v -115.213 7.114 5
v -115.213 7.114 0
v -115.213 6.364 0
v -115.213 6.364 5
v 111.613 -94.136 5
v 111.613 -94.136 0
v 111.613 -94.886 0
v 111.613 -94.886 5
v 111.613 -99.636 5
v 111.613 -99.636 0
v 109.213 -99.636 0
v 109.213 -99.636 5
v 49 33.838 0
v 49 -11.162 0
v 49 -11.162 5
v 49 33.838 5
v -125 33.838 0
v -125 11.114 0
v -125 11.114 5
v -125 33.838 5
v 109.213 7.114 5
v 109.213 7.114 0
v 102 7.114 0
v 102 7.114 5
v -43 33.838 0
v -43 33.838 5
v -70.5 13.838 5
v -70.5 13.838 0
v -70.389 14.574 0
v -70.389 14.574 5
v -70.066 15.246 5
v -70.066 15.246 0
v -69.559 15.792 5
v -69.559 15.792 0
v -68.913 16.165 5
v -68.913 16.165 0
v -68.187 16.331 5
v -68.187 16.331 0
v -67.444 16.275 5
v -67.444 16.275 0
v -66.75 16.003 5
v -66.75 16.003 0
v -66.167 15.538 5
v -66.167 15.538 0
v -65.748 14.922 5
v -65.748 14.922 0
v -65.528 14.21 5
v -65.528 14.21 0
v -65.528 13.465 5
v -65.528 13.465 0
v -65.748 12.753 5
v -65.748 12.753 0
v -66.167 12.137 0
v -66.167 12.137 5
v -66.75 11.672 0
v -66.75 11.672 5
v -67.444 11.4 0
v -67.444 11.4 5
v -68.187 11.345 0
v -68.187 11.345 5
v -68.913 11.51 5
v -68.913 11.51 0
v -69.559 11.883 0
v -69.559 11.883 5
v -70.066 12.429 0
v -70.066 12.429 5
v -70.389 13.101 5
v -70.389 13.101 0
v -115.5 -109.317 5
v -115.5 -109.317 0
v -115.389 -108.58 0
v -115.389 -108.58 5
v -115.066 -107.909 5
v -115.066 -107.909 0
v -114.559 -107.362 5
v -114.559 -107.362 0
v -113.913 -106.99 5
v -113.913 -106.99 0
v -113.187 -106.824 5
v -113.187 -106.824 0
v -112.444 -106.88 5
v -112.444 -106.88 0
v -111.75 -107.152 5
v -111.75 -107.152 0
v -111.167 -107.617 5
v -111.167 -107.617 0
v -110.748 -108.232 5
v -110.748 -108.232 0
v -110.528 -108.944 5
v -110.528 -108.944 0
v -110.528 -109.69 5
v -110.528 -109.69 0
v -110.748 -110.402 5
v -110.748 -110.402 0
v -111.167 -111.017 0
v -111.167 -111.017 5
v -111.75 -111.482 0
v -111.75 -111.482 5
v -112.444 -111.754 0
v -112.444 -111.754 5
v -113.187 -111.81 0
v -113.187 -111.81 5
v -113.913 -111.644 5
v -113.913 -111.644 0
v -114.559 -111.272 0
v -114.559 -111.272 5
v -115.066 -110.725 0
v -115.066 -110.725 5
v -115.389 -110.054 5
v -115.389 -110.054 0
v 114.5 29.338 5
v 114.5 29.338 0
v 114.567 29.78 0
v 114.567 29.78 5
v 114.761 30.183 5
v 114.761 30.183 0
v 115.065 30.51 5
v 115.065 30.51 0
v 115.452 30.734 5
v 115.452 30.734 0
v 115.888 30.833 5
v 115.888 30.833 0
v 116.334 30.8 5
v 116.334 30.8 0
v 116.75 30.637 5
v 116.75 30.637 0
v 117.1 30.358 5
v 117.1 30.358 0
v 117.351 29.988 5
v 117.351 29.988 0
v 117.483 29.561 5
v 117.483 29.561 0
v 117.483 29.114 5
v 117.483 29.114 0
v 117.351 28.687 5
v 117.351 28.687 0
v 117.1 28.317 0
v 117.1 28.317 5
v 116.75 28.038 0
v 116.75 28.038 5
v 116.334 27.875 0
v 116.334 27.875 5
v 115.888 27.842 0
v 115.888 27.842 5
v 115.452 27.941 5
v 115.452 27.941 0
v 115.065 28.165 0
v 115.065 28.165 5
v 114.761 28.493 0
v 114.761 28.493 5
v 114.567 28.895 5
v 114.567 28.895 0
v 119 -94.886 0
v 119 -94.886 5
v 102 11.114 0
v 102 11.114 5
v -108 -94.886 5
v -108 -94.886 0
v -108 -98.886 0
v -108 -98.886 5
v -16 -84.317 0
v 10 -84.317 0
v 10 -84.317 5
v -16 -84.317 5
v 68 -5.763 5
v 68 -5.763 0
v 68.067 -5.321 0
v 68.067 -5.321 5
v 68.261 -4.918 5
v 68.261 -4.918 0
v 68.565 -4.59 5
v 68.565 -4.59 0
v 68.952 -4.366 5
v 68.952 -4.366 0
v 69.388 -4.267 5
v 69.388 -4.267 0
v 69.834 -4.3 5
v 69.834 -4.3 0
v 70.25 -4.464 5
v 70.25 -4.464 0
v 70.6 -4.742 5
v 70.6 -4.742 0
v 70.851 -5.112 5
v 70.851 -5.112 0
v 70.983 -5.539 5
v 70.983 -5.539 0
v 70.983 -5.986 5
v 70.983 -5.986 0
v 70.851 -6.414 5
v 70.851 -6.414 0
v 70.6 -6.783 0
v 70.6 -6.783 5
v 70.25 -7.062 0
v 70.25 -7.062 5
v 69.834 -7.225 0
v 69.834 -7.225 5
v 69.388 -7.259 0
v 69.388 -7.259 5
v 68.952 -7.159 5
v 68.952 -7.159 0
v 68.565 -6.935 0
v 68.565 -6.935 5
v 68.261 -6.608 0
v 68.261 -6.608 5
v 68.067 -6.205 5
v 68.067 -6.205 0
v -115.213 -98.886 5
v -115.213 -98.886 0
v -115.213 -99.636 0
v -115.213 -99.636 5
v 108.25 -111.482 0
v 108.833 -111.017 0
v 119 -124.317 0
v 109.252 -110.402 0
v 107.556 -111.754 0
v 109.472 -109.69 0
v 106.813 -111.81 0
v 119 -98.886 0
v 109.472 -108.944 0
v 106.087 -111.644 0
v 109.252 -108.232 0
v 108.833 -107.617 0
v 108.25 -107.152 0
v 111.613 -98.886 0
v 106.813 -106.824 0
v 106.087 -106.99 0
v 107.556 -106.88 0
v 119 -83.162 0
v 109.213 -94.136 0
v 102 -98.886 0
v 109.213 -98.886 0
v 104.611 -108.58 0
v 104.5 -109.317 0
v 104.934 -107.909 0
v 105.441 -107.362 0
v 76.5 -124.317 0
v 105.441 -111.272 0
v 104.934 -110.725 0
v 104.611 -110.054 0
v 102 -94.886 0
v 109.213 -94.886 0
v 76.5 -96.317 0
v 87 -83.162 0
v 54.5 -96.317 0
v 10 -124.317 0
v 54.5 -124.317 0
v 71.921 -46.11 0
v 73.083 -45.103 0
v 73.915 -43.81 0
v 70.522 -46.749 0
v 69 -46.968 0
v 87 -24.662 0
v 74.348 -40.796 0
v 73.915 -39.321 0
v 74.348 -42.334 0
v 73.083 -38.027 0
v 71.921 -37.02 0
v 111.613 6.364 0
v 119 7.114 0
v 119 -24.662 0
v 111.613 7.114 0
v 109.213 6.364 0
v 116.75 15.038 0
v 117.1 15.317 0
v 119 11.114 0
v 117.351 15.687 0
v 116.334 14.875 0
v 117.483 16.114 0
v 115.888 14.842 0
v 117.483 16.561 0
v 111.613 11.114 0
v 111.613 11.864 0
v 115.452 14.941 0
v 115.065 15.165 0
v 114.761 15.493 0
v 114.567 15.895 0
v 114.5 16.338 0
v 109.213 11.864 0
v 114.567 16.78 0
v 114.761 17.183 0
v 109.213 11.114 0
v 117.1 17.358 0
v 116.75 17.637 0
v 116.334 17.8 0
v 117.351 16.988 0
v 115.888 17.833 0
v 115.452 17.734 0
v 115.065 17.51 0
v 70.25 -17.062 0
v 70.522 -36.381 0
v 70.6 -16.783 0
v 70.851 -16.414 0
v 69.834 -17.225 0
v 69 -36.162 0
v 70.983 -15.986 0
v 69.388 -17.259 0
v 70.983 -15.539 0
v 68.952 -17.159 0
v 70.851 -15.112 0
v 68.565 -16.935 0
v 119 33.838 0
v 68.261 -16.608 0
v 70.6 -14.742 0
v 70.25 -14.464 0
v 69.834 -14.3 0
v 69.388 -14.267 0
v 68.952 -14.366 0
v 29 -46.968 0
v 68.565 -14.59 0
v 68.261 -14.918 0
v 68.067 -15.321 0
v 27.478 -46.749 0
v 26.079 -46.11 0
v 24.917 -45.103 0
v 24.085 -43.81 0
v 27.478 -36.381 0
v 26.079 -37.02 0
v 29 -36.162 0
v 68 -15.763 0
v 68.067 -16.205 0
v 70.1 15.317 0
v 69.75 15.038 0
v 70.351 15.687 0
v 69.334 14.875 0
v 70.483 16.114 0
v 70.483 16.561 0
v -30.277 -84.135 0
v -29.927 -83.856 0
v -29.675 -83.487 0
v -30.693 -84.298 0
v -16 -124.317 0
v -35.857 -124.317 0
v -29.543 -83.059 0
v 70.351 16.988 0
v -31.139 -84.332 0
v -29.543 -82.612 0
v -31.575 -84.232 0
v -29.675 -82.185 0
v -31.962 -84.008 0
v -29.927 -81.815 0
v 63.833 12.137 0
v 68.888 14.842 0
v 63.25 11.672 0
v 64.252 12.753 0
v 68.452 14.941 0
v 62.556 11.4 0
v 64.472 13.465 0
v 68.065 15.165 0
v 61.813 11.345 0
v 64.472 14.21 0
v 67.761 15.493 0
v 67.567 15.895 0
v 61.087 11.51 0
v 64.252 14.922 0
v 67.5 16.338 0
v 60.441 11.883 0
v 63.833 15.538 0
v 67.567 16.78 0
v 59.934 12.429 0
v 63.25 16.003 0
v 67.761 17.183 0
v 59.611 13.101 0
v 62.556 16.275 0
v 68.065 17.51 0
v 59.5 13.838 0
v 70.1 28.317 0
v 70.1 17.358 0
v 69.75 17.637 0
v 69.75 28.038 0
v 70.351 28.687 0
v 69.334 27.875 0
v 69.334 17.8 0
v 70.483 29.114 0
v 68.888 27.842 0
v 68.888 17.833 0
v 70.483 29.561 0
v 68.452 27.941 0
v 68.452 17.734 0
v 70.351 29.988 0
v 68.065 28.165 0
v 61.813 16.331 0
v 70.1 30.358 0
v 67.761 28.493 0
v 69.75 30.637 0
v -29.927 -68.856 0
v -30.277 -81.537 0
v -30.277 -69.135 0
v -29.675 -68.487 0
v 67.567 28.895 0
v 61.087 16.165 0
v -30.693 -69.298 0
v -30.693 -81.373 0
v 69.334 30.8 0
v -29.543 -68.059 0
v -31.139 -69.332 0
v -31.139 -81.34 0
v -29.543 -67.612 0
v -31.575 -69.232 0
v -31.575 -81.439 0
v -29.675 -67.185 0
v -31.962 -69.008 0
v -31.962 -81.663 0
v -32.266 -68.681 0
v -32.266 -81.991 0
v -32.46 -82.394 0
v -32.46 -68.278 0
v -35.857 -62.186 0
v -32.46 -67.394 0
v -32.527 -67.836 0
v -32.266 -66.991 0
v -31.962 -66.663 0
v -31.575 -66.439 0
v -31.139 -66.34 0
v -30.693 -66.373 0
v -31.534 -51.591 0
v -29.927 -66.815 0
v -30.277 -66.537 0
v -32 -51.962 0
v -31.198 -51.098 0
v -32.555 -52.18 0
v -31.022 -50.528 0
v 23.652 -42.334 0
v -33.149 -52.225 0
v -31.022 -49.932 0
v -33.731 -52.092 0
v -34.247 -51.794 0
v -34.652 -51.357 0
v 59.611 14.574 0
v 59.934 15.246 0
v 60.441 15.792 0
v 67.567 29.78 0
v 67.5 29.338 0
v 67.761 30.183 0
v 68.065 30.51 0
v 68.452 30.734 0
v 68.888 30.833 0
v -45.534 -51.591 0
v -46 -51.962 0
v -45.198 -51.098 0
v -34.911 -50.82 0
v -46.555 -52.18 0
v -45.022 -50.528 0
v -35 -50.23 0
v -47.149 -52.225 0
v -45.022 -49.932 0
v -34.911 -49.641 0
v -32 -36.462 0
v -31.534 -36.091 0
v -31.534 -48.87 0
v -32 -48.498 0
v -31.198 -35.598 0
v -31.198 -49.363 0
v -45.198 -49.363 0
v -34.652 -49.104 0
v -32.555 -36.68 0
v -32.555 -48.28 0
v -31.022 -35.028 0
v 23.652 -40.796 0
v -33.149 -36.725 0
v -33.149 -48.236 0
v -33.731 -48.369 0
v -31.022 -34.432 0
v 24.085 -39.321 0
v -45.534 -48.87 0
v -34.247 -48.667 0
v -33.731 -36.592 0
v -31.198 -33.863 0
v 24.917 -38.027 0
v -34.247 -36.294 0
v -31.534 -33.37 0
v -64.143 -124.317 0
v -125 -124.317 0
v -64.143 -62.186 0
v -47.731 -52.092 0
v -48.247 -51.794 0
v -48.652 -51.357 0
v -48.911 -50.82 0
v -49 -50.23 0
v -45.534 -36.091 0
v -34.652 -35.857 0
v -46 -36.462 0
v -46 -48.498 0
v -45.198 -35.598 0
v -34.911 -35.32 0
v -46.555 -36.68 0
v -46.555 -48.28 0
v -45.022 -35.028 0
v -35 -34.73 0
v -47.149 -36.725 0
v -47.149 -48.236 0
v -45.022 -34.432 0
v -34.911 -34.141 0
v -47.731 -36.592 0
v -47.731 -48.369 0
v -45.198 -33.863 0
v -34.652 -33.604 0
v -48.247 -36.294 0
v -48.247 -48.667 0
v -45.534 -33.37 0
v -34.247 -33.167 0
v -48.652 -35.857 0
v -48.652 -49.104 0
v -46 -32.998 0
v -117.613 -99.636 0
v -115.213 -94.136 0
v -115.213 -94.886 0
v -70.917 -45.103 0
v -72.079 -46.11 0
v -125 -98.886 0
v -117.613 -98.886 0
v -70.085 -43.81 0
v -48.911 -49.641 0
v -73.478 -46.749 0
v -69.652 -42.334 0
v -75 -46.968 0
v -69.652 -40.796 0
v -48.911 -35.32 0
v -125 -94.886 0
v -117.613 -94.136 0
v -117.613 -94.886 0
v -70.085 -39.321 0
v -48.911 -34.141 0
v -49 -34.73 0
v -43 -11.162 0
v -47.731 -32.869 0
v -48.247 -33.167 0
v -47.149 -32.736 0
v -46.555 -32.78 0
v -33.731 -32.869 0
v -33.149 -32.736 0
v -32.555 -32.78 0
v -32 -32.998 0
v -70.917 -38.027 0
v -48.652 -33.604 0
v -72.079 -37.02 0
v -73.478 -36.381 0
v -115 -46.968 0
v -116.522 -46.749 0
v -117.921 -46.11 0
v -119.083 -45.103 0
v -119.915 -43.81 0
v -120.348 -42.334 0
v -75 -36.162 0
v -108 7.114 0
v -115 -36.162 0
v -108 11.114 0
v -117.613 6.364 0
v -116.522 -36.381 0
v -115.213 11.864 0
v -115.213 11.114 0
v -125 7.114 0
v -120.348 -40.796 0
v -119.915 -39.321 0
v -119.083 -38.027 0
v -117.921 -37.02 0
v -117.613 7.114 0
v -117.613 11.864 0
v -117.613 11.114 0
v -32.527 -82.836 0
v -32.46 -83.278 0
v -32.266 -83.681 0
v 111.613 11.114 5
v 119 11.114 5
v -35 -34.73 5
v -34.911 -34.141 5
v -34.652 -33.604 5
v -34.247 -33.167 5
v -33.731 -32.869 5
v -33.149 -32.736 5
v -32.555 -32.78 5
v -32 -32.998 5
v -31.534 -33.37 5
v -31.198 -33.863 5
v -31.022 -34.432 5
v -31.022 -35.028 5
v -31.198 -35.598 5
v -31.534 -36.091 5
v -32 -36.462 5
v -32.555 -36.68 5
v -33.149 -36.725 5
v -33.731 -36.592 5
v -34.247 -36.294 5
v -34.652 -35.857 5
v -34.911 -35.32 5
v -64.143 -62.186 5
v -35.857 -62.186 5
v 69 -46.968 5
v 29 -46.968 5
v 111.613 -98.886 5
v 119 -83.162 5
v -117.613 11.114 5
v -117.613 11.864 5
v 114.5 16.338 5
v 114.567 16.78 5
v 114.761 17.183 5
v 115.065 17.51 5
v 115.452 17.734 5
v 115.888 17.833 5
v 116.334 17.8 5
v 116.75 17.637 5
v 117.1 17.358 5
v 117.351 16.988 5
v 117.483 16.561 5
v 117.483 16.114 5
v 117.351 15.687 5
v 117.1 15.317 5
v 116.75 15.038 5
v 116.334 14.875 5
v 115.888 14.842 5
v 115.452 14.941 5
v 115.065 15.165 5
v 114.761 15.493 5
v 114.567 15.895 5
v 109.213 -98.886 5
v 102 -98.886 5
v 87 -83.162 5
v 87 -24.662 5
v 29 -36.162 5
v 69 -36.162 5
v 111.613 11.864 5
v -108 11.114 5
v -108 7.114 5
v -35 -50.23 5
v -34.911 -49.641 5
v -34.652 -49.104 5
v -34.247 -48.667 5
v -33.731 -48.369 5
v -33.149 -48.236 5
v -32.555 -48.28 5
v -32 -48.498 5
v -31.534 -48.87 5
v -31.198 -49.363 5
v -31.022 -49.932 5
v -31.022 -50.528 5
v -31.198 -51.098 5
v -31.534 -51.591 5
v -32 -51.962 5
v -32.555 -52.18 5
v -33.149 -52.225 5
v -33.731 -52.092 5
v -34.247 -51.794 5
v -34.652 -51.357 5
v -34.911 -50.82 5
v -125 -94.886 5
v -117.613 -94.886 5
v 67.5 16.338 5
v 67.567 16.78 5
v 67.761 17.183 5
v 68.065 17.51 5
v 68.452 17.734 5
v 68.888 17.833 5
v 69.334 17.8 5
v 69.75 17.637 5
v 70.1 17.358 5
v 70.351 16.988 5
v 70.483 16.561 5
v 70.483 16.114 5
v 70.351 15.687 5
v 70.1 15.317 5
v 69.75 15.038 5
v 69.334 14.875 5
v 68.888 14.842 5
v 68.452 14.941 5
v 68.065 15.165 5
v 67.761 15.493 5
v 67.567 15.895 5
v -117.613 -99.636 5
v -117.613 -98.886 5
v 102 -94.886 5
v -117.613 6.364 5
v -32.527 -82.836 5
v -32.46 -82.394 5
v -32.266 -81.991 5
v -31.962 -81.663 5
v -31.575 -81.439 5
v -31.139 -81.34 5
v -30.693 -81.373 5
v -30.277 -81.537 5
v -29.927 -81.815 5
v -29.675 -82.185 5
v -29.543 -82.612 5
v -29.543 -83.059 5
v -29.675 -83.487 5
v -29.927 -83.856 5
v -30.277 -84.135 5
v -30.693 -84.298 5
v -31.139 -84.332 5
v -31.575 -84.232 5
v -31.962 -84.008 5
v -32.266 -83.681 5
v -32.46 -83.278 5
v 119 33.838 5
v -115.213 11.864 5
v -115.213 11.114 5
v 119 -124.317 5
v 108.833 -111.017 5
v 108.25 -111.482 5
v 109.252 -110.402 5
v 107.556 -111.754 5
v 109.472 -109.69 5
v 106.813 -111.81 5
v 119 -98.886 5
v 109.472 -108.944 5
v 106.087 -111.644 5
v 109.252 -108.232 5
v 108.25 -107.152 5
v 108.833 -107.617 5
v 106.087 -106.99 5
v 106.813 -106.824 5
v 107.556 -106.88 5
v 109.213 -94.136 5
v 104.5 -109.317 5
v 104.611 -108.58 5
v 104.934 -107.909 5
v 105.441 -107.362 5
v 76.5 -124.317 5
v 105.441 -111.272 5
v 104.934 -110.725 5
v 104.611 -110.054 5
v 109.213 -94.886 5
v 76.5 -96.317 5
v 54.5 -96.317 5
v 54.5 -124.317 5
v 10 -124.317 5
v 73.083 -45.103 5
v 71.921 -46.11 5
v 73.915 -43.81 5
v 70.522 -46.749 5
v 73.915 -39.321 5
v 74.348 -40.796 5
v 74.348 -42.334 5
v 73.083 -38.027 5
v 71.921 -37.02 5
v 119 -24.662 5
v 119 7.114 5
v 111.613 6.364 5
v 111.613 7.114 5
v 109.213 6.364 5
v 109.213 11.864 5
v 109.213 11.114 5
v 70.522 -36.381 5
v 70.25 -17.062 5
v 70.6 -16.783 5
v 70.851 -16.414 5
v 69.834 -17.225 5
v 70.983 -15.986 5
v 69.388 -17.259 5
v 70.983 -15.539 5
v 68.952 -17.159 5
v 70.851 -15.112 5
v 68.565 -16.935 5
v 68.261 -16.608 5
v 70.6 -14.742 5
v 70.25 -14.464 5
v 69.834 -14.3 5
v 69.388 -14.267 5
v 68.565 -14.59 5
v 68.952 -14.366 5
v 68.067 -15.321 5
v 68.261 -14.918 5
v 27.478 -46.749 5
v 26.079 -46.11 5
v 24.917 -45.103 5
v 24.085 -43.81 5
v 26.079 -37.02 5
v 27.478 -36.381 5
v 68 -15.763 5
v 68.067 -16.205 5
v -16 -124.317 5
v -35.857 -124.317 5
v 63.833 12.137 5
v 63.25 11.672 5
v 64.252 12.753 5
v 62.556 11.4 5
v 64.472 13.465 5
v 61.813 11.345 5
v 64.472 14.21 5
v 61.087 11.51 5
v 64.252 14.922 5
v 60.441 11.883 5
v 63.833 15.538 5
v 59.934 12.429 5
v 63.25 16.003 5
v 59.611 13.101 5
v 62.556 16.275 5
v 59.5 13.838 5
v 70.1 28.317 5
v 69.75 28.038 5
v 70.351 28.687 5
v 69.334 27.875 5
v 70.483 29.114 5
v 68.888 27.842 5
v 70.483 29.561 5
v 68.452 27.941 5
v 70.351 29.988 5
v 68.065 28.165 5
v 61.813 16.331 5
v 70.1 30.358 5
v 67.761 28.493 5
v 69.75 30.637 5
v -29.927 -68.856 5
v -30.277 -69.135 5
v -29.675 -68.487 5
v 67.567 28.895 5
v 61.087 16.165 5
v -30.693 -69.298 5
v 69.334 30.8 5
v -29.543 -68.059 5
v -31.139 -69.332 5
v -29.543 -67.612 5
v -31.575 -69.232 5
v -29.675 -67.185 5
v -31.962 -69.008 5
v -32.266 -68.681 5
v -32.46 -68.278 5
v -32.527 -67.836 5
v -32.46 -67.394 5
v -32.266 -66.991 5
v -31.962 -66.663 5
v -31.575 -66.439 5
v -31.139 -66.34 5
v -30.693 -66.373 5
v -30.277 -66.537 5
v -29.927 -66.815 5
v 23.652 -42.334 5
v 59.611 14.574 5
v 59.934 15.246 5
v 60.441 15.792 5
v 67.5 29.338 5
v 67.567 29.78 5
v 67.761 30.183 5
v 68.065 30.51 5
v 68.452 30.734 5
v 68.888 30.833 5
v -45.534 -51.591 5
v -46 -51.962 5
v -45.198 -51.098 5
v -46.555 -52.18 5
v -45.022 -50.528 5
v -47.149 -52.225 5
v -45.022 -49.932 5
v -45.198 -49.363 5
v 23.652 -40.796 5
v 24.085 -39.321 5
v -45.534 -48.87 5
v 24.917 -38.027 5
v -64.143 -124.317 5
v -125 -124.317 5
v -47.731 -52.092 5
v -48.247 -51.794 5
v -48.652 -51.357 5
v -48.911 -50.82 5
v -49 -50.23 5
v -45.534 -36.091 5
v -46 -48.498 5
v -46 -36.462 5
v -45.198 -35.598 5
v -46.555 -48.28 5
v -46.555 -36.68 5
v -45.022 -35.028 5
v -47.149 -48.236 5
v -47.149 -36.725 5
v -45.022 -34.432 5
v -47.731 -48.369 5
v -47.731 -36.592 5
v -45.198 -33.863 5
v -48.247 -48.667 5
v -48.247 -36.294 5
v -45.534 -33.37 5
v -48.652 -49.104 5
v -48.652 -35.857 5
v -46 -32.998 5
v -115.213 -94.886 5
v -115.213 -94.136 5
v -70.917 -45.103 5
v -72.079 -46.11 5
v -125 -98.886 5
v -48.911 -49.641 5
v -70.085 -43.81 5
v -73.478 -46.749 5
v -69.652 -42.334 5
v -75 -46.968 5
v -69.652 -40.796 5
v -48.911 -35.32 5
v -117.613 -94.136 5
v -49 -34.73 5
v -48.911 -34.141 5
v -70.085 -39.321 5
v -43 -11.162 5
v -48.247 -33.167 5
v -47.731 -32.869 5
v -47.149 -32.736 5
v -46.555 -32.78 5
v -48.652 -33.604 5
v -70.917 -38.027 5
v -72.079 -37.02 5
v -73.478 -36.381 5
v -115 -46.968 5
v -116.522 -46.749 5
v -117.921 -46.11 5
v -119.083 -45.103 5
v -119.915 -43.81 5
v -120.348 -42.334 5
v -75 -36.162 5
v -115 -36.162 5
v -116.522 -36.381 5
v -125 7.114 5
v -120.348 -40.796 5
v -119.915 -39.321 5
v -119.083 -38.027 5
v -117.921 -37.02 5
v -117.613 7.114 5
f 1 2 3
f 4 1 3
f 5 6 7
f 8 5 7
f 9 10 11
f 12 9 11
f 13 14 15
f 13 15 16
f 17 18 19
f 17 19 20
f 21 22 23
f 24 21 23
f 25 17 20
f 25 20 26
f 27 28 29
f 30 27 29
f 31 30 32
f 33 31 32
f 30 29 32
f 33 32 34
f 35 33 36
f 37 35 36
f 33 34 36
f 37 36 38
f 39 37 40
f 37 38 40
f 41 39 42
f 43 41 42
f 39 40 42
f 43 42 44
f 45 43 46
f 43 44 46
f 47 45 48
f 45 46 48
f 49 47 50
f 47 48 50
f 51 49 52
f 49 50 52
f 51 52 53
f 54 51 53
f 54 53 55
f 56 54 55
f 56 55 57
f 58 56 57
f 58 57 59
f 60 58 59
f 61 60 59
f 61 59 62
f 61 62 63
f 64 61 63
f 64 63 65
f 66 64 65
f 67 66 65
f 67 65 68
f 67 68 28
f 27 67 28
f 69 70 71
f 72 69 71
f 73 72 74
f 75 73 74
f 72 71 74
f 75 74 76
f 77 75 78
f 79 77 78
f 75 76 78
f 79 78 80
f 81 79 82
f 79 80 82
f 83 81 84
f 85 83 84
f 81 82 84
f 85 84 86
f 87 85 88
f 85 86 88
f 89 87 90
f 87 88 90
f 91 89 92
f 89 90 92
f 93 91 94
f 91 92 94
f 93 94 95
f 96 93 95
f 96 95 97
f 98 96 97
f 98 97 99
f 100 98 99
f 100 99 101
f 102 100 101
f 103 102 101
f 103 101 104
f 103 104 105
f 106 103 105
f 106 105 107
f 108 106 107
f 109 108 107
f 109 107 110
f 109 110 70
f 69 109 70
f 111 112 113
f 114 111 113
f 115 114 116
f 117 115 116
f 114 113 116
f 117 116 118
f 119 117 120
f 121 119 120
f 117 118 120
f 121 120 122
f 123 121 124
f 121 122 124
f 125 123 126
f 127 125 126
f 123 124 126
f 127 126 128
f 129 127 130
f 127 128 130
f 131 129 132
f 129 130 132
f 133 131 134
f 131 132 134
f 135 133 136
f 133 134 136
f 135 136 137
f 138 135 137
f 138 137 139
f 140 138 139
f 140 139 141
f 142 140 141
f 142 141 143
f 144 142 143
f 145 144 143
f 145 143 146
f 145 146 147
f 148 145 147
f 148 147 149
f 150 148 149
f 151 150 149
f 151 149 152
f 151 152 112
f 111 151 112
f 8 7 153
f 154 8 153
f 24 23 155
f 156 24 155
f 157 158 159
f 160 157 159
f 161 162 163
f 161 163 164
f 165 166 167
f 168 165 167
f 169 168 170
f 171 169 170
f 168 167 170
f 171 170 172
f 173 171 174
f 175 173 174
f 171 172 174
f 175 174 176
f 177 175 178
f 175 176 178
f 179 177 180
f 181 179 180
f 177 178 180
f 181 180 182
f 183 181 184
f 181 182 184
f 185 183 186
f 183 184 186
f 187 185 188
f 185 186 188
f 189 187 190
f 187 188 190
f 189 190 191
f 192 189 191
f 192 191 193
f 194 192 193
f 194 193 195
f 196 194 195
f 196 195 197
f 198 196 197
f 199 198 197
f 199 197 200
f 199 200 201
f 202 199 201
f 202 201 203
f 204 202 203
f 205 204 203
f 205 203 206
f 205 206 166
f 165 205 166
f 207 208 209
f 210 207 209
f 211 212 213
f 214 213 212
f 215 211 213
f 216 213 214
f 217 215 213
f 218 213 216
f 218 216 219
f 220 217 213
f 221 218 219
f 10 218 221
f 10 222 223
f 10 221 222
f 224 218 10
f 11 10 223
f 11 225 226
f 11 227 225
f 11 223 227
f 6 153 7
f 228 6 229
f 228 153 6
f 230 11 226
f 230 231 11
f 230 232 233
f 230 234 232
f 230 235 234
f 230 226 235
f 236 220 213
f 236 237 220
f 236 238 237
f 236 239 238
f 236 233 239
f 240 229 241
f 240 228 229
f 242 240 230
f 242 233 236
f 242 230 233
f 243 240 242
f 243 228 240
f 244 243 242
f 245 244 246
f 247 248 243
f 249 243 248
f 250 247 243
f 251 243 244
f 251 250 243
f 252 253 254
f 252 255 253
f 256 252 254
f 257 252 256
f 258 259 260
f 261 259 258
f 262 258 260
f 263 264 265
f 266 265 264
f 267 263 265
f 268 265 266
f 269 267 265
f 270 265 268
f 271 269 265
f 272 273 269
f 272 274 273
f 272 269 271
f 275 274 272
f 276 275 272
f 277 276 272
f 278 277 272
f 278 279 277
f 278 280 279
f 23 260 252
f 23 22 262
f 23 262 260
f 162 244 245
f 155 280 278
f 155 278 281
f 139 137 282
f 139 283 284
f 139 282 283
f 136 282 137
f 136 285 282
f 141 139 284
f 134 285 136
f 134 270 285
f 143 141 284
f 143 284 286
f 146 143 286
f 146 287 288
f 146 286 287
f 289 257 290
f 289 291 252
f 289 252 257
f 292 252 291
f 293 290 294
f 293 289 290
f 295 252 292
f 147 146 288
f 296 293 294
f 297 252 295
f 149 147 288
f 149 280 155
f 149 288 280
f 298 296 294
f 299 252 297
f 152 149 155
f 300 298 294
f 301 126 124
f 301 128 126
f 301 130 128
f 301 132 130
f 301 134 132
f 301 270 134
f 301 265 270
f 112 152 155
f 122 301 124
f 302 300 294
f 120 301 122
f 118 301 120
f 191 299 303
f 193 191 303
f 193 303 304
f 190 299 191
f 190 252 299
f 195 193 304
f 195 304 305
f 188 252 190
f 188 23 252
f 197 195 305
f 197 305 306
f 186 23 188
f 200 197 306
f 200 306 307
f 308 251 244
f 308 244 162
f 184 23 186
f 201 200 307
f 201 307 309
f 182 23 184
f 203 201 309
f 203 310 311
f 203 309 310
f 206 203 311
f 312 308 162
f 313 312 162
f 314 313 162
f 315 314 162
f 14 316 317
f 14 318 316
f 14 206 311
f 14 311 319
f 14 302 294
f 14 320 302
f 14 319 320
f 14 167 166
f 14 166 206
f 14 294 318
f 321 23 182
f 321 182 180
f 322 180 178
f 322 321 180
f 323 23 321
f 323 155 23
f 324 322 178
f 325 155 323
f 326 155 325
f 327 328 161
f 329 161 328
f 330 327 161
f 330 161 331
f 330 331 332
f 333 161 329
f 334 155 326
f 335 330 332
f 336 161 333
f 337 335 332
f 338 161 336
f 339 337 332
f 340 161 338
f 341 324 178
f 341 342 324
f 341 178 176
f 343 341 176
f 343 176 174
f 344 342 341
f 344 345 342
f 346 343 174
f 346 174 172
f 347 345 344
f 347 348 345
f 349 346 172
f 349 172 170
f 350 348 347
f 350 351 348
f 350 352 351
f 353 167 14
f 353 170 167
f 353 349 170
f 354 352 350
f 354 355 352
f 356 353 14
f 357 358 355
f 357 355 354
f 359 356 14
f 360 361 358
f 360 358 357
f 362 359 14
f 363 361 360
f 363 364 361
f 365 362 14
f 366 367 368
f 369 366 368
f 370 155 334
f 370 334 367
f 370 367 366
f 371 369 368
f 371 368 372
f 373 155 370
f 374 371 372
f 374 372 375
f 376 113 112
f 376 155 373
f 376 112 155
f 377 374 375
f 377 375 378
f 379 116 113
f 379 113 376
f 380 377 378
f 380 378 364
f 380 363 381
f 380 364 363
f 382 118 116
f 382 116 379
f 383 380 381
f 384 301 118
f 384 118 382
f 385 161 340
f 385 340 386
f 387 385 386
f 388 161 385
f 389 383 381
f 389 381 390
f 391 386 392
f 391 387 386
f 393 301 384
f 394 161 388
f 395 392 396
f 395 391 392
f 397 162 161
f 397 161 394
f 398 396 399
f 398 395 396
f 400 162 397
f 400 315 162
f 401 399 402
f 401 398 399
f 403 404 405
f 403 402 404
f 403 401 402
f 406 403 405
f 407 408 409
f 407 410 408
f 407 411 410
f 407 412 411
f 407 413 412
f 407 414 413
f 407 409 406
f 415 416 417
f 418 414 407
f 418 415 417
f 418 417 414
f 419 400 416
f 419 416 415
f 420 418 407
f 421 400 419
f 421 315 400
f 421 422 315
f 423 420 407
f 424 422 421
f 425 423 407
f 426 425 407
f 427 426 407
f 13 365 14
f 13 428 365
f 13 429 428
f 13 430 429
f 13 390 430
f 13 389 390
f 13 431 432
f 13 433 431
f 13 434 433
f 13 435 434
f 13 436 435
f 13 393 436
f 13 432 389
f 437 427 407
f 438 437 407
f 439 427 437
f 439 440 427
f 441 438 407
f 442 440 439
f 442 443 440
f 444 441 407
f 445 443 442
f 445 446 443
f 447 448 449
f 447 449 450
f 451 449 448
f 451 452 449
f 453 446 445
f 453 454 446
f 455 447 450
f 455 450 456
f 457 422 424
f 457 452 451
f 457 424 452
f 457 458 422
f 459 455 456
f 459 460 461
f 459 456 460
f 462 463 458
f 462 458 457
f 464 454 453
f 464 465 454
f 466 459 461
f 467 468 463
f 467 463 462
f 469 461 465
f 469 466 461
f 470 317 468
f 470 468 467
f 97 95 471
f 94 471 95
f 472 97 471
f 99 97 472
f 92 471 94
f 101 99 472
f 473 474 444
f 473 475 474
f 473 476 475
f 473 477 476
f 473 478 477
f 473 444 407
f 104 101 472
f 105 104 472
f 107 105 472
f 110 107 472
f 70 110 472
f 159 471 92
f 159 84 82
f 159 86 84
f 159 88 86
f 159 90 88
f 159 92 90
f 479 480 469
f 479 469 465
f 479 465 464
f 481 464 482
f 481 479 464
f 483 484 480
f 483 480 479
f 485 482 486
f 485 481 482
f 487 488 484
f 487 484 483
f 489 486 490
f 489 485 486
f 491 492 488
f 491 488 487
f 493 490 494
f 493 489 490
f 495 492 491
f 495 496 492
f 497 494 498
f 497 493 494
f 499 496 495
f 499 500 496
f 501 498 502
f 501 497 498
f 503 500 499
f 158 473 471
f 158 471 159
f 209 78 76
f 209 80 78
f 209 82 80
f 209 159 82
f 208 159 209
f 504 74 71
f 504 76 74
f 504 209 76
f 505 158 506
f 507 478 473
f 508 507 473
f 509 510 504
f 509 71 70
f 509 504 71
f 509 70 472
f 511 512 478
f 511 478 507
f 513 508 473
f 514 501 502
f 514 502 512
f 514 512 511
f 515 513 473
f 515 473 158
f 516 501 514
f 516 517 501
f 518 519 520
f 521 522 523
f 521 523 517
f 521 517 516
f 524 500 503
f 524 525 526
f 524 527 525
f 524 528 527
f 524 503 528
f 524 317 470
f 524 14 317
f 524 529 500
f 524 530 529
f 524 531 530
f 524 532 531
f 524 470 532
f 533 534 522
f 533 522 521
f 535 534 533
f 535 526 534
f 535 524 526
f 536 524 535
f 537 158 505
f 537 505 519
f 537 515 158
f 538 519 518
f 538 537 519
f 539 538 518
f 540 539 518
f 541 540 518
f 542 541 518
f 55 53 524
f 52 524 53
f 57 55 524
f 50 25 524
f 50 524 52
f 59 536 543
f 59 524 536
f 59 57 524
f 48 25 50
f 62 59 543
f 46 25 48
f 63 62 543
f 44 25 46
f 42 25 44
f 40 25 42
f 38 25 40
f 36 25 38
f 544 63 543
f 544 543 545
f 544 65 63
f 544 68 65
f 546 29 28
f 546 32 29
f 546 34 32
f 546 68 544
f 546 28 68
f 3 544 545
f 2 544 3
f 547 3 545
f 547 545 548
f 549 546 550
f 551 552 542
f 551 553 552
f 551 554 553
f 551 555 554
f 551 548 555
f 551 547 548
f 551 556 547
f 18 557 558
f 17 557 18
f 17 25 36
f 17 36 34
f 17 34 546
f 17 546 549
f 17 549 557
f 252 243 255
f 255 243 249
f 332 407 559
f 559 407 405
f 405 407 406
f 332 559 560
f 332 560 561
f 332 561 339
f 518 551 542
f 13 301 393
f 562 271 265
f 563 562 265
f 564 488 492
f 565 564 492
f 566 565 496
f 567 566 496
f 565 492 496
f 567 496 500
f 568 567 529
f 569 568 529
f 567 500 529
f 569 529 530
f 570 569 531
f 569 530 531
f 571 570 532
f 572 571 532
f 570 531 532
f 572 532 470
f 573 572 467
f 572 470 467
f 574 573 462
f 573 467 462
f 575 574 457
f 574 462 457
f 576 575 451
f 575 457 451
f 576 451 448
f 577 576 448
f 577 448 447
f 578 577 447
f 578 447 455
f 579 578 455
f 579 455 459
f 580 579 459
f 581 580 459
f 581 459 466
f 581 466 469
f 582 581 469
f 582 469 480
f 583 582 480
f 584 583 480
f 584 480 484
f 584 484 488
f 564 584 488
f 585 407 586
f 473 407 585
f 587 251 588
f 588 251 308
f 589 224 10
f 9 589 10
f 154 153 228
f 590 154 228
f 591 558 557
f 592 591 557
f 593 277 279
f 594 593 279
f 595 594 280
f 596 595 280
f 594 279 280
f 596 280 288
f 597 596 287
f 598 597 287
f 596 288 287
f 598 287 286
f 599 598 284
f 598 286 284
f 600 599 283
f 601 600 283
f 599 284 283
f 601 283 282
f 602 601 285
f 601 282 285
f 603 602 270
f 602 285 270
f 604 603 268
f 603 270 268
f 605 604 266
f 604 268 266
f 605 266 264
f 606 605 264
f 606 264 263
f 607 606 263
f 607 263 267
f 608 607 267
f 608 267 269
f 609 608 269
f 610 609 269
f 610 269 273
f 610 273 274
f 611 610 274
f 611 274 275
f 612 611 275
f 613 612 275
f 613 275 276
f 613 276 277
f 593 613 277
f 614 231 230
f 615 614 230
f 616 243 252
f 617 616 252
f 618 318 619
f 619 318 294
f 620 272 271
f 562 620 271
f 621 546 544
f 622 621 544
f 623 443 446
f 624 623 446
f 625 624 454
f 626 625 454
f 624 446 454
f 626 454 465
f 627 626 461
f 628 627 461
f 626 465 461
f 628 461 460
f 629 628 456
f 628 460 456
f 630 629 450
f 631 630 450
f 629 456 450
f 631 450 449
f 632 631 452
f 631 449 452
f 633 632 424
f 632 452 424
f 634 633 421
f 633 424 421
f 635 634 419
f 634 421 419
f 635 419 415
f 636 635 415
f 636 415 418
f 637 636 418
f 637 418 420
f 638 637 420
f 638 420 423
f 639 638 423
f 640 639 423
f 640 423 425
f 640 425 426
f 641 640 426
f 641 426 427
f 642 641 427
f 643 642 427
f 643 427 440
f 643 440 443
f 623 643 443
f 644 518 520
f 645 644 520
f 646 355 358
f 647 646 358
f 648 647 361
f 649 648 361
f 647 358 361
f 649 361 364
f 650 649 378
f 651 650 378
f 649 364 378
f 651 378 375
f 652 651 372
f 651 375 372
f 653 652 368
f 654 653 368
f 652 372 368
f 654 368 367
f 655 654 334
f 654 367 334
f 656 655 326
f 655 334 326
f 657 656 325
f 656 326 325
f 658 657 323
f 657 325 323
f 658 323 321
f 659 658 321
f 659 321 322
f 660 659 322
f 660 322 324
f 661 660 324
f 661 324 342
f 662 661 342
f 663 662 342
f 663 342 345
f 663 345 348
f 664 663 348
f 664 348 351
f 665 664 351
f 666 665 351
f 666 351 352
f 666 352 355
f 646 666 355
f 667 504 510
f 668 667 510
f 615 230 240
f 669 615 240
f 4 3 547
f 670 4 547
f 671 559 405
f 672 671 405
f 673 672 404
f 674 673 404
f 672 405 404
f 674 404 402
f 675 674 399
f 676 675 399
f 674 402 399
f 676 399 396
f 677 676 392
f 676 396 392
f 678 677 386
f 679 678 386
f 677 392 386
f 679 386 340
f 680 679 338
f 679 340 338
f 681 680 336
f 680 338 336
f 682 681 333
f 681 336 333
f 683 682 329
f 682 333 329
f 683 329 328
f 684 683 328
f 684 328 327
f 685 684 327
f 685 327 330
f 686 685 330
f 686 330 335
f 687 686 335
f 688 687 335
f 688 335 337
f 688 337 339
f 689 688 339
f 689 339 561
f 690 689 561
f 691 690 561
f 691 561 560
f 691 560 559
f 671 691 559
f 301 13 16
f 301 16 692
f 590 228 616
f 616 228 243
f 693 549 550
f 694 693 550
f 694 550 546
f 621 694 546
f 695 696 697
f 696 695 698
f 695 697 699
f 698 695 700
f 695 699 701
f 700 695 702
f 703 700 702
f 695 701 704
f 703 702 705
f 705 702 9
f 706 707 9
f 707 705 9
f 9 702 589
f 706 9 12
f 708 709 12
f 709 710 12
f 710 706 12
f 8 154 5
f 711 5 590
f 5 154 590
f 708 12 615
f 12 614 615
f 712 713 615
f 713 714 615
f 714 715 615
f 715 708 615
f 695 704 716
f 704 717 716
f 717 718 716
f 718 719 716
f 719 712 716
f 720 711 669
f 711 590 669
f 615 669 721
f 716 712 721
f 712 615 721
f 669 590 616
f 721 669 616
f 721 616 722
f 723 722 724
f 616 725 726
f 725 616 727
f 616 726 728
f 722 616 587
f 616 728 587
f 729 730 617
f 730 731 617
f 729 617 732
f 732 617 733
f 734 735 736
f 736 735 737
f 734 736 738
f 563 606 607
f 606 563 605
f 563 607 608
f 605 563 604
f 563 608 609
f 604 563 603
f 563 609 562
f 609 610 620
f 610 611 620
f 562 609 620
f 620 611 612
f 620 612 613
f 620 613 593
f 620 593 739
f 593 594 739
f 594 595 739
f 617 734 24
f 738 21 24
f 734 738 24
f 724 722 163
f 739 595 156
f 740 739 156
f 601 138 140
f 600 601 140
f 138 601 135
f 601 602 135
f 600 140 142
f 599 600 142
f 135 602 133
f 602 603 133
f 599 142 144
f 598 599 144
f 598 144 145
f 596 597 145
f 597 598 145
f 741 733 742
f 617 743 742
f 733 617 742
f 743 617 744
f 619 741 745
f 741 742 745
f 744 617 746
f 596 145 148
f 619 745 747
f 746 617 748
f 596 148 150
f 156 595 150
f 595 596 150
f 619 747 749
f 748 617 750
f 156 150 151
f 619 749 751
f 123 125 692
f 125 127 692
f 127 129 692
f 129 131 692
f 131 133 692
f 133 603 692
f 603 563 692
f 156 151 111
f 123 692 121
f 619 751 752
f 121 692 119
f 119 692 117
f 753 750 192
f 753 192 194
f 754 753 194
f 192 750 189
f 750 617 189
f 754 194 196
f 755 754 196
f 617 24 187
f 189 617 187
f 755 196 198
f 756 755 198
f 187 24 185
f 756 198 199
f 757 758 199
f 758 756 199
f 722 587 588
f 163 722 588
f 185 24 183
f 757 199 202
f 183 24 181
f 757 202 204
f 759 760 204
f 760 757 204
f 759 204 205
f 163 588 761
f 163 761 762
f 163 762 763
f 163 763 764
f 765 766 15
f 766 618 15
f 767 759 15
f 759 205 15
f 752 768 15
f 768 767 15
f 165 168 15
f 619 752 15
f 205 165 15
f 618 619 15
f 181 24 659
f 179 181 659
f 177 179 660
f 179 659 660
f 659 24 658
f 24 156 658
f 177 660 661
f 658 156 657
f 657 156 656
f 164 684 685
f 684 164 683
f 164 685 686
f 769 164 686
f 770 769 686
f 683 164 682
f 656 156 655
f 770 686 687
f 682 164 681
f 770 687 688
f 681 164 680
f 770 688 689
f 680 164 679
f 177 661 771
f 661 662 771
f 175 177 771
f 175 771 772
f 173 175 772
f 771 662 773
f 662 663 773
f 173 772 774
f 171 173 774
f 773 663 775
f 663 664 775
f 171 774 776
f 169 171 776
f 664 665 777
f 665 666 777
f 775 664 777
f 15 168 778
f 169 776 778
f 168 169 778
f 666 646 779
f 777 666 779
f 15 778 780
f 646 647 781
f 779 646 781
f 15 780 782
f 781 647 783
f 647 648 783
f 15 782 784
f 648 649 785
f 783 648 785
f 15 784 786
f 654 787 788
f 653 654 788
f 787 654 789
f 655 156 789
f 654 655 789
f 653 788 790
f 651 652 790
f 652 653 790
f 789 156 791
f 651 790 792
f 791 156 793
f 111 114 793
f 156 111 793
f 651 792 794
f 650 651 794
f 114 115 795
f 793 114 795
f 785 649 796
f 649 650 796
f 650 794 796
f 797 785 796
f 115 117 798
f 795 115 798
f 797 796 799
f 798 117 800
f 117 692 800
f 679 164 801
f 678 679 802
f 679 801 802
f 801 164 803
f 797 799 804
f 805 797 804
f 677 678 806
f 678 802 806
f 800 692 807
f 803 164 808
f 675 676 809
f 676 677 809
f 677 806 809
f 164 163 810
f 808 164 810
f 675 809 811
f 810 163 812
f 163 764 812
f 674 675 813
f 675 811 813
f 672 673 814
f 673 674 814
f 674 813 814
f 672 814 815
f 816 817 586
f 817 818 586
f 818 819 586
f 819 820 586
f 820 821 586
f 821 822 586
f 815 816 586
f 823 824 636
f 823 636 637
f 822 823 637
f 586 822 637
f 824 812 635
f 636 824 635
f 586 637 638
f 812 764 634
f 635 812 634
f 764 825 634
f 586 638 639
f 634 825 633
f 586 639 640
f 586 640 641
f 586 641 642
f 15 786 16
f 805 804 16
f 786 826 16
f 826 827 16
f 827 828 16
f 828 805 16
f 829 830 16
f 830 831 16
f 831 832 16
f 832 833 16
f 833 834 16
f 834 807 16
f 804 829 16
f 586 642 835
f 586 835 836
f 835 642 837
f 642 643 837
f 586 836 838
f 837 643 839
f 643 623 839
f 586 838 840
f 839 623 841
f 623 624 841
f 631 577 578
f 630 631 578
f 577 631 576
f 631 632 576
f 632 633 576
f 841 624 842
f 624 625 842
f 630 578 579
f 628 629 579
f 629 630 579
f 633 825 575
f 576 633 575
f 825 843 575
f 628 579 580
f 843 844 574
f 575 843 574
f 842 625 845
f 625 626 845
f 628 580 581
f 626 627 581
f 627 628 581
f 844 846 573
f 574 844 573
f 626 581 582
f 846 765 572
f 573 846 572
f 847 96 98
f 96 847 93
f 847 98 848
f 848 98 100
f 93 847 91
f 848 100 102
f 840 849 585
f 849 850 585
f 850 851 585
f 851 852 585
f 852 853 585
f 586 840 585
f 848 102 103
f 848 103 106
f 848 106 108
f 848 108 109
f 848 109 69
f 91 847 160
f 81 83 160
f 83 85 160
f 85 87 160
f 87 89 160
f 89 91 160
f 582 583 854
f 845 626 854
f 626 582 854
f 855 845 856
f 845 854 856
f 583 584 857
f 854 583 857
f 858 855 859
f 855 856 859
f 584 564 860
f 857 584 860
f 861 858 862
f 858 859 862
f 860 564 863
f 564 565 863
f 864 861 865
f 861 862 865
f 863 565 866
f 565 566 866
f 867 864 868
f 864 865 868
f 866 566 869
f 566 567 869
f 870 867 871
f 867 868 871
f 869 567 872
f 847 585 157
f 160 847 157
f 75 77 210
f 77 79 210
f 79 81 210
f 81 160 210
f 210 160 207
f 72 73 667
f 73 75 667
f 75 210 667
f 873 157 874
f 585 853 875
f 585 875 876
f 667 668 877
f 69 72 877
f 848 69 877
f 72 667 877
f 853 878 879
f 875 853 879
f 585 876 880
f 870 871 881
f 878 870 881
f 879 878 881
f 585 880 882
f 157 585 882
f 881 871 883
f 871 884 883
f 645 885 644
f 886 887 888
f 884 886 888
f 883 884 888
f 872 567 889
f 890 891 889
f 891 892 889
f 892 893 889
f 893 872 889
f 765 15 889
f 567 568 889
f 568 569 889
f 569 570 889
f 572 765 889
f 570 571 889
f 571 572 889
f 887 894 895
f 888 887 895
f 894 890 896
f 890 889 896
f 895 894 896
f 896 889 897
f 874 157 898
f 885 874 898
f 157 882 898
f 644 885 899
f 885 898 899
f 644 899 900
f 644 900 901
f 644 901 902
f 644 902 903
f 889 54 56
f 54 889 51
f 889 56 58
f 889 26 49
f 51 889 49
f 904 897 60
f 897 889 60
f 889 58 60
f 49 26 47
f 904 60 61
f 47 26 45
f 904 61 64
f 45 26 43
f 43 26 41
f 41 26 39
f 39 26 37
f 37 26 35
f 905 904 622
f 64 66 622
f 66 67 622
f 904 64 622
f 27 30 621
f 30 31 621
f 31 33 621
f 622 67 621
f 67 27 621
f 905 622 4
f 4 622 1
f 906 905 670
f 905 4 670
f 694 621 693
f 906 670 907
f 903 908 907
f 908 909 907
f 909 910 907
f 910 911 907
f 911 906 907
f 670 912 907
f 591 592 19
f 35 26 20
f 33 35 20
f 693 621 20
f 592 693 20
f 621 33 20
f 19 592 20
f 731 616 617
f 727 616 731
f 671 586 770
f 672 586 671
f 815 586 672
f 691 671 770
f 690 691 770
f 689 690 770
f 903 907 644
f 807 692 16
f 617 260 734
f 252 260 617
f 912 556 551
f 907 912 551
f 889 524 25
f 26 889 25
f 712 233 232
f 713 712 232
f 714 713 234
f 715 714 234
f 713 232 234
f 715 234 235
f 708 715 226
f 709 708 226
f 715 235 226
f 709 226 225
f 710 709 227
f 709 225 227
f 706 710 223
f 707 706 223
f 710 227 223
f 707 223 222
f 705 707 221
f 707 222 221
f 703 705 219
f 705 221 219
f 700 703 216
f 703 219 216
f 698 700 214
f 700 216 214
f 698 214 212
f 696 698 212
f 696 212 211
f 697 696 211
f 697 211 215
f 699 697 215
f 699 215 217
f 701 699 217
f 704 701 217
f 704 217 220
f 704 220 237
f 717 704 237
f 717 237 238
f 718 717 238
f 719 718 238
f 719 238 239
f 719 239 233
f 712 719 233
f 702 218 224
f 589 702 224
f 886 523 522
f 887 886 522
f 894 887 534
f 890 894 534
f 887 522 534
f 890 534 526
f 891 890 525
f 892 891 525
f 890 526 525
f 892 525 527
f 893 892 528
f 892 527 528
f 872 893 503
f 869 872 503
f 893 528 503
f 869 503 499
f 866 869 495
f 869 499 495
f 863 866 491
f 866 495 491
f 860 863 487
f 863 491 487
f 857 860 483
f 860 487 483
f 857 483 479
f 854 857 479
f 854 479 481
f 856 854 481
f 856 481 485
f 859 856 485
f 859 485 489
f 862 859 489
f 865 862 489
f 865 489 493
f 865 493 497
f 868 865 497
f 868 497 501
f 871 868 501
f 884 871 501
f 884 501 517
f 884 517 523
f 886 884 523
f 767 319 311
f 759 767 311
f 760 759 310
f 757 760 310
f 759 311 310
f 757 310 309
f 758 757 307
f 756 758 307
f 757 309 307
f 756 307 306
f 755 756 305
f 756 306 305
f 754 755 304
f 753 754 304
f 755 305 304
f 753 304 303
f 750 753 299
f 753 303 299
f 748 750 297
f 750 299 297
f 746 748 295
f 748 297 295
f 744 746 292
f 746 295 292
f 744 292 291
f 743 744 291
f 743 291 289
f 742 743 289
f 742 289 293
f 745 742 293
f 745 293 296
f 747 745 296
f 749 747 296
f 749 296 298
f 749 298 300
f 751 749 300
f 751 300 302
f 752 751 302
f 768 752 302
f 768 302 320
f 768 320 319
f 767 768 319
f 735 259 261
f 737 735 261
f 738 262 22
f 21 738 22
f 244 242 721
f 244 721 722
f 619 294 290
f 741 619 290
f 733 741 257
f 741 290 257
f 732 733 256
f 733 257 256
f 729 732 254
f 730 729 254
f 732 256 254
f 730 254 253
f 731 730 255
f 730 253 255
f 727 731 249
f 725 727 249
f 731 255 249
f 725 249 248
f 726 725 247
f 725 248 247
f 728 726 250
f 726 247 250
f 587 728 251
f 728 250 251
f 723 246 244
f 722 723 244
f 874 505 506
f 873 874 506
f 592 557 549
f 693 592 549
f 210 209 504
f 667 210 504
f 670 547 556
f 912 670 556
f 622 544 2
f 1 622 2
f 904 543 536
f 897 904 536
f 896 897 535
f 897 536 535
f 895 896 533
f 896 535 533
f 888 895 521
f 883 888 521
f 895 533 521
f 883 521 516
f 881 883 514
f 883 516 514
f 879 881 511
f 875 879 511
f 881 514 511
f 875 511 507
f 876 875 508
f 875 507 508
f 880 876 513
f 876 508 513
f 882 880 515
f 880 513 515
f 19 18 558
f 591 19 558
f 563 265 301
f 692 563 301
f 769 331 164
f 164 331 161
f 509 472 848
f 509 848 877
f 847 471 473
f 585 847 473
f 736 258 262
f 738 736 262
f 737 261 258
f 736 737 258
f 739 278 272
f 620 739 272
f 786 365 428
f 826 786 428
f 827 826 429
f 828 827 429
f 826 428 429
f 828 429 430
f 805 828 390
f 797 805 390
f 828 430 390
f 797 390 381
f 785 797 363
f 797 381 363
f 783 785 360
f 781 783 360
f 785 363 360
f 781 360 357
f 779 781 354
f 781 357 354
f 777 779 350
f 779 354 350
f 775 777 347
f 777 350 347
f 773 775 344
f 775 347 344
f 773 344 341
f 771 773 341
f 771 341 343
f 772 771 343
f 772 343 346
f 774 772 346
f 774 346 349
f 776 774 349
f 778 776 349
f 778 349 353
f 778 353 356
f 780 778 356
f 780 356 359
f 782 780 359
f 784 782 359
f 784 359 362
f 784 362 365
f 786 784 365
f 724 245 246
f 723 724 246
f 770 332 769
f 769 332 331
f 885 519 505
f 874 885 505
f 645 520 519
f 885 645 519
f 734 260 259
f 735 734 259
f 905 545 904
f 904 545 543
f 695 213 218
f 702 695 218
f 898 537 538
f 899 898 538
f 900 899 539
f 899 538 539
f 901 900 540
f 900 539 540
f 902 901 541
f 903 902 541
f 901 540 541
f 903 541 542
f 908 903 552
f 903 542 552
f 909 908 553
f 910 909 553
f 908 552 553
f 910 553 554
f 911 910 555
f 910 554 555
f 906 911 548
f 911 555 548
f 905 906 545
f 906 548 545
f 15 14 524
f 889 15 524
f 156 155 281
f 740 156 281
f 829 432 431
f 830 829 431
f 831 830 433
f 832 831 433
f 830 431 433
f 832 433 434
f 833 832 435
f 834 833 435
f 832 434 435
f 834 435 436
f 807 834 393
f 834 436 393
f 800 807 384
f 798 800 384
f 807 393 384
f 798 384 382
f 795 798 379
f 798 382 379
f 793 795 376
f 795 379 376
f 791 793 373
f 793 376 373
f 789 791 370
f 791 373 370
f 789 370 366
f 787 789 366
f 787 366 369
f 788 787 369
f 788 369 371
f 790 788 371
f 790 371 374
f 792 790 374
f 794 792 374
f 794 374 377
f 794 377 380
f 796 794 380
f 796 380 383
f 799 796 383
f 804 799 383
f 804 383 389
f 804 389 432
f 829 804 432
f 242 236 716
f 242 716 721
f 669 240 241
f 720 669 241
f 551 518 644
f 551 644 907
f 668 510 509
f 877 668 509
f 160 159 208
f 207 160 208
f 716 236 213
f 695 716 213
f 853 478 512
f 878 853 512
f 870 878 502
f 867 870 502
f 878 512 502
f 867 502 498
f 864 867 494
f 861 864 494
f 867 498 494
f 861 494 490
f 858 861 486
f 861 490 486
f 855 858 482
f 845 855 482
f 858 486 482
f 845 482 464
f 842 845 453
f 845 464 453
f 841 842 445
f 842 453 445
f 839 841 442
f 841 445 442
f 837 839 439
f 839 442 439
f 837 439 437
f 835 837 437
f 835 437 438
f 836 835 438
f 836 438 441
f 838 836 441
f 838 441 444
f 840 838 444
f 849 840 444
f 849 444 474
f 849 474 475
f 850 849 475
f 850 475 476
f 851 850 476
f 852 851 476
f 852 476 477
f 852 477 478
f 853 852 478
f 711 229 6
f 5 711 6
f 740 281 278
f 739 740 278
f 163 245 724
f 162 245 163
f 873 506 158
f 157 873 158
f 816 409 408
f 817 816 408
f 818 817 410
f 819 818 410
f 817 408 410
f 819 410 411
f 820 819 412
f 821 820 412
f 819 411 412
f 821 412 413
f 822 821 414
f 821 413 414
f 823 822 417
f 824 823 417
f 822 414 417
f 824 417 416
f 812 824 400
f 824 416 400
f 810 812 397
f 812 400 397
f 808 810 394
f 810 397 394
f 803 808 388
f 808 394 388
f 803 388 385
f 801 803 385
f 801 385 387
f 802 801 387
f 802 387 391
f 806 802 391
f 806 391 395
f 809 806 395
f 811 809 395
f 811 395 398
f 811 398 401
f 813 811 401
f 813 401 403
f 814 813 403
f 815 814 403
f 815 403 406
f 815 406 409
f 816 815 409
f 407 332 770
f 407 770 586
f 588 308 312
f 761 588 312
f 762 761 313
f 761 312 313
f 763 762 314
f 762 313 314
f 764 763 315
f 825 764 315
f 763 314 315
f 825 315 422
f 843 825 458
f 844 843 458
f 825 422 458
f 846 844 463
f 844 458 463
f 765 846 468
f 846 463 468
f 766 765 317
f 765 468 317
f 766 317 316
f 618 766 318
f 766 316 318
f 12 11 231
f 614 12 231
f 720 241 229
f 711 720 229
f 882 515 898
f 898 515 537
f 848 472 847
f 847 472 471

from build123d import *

# Parameters (mm, degrees)
SKETCH1_W           = 244
SKETCH1_H           = 158.154567899
BOSS_EXTRUDE2_DEPTH = 5
SKETCH2_W           = 28.286613298
SKETCH2_H           = 62.131328865
CUT_EXTRUDE1_DEPTH  = 10
SKETCH7_W           = 32
SKETCH7_H           = 84.5
CUT_EXTRUDE5_DEPTH  = 10
SKETCH9_R           = 1.5
CUT_EXTRUDE7_DEPTH  = 10
SKETCH10_W          = 26
SKETCH10_H          = 40
CUT_EXTRUDE8_DEPTH  = 10
SKETCH12_W          = 92
SKETCH12_H          = 45
CUT_EXTRUDE10_DEPTH = 10
SKETCH13_R          = 2.5
CUT_EXTRUDE11_DEPTH = 10
CUT_EXTRUDE12_DEPTH = 10
SKETCH15_W          = 32
SKETCH15_H          = 26
BOSS_EXTRUDE3_DEPTH = 5
SKETCH16_R          = 1.5
CUT_EXTRUDE13_DEPTH = 10
SKETCH17_R          = 1.5
CUT_EXTRUDE14_DEPTH = 10
SKETCH19_R          = 2
CUT_EXTRUDE16_DEPTH = 10
SKETCH20_W          = 22
SKETCH20_H          = 28
CUT_EXTRUDE17_DEPTH = 10
CUT_EXTRUDE18_DEPTH = 10


with BuildPart() as part:
    # Sketch1 → Boss-Extrude2 (new body)
    with BuildSketch(Plane.XY):
        with Locations((-3, -45.239754423)):
            Rectangle(SKETCH1_W, SKETCH1_H)
    extrude(amount=BOSS_EXTRUDE2_DEPTH)

    # Sketch2 → Cut-Extrude1 (cut)
    with BuildSketch(Plane(origin=(0, 0, 0), x_dir=(-1, 0, 0), z_dir=(0, 0, -1))):
        with Locations((50, -93.25137394)):
            Rectangle(SKETCH2_W, SKETCH2_H)
    extrude(amount=-CUT_EXTRUDE1_DEPTH, mode=Mode.SUBTRACT)

    # Sketch7 → Cut-Extrude5 (cut)
    with BuildSketch(Plane(origin=(0, 0, 0), x_dir=(-1, 0, 0), z_dir=(0, 0, -1))):
        with Locations((-103, -40.912470473)):
            Rectangle(SKETCH7_W, SKETCH7_H)
    extrude(amount=-CUT_EXTRUDE5_DEPTH, mode=Mode.SUBTRACT)

    # Sketch9 → Cut-Extrude7 (cut)
    with BuildSketch(Plane(origin=(0, 0, 0), x_dir=(-1, 0, 0), z_dir=(0, 0, -1))):
        with Locations((31.026566737, -67.835709507)):
            Circle(SKETCH9_R)
        with Locations((31.026566737, -82.835709507)):
            Circle(SKETCH9_R)
    extrude(amount=-CUT_EXTRUDE7_DEPTH, mode=Mode.SUBTRACT)

    # Sketch10 → Cut-Extrude8 (cut)
    with BuildSketch(Plane(origin=(0, 0, 0), x_dir=(-1, 0, 0), z_dir=(0, 0, -1))):
        with Locations((3, -104.317038372)):
            Rectangle(SKETCH10_W, SKETCH10_H)
    extrude(amount=-CUT_EXTRUDE8_DEPTH, mode=Mode.SUBTRACT)

    # Sketch12 → Cut-Extrude10 (cut)
    with BuildSketch(Plane(origin=(0, 0, 0), x_dir=(-1, 0, 0), z_dir=(0, 0, -1))):
        with Locations((-3, 11.337529527)):
            Rectangle(SKETCH12_W, SKETCH12_H)
    extrude(amount=-CUT_EXTRUDE10_DEPTH, mode=Mode.SUBTRACT)

    # Sketch13 → Cut-Extrude11 (cut)
    with BuildSketch(Plane(origin=(0, 0, 0), x_dir=(-1, 0, 0), z_dir=(0, 0, -1))):
        with Locations((-107, -109.317038372)):
            Circle(SKETCH13_R)
        with Locations((113, -109.317038372)):
            Circle(SKETCH13_R)
        with Locations((-62, 13.837529527)):
            Circle(SKETCH13_R)
        with Locations((68, 13.837529527)):
            Circle(SKETCH13_R)
    extrude(amount=-CUT_EXTRUDE11_DEPTH, mode=Mode.SUBTRACT)

    # Sketch14 → Cut-Extrude12 (cut)
    with BuildSketch(Plane(origin=(0, 0, 0), x_dir=(-1, 0, 0), z_dir=(0, 0, -1))):
        Polygon((-119, -94.885674772), (-119, -98.885674772), (-111.613125162, -98.885674772), (-111.613125162, -99.635674772), (-109.213125162, -99.635674772), (-109.213125162, -98.885674772), (-102, -98.885674772), (-102, -94.885674772), (-109.213125162, -94.885674772), (-109.213125162, -94.135674772), (-111.613125162, -94.135674772), (-111.613125162, -94.885674772), align=None)
        Polygon((-102, 11.114325228), (-109.213125162, 11.114325228), (-109.213125162, 11.864325228), (-111.613125162, 11.864325228), (-111.613125162, 11.114325228), (-119, 11.114325228), (-119, 7.114325228), (-111.613125162, 7.114325228), (-111.613125162, 6.364325228), (-109.213125162, 6.364325228), (-109.213125162, 7.114325228), (-102, 7.114325228), align=None)
        Polygon((117.613125162, 7.114325228), (125, 7.114325228), (125, 11.114325228), (117.613125162, 11.114325228), (117.613125162, 11.864325228), (115.213125162, 11.864325228), (115.213125162, 11.114325228), (108, 11.114325228), (108, 7.114325228), (115.213125162, 7.114325228), (115.213125162, 6.364325228), (117.613125162, 6.364325228), align=None)
        Polygon((117.613125162, -98.885674772), (125, -98.885674772), (125, -94.885674772), (117.613125162, -94.885674772), (117.613125162, -94.135674772), (115.213125162, -94.135674772), (115.213125162, -94.885674772), (108, -94.885674772), (108, -98.885674772), (115.213125162, -98.885674772), (115.213125162, -99.635674772), (117.613125162, -99.635674772), align=None)
    extrude(amount=-CUT_EXTRUDE12_DEPTH, mode=Mode.SUBTRACT)

    # Sketch15 → Boss-Extrude3 (add)
    with BuildSketch(Plane(origin=(0, 0, 0), x_dir=(-1, 0, 0), z_dir=(0, 0, -1))):
        with Locations((-103, -11.662470473)):
            Rectangle(SKETCH15_W, SKETCH15_H)
    extrude(amount=-BOSS_EXTRUDE3_DEPTH)

    # Sketch16 → Cut-Extrude13 (cut)
    with BuildSketch(Plane(origin=(0, 0, 0), x_dir=(-1, 0, 0), z_dir=(0, 0, -1))):
        with Locations((-69.5, -5.762708109)):
            Circle(SKETCH16_R)
        with Locations((-69.5, -15.762708109)):
            Circle(SKETCH16_R)
    extrude(amount=-CUT_EXTRUDE13_DEPTH, mode=Mode.SUBTRACT)

    # Sketch17 → Cut-Extrude14 (cut)
    with BuildSketch(Plane(origin=(0, 0, 0), x_dir=(-1, 0, 0), z_dir=(0, 0, -1))):
        with Locations((-69, 16.337529527)):
            Circle(SKETCH17_R)
        with Locations((-69, 29.337529527)):
            Circle(SKETCH17_R)
        with Locations((-116, 16.337529527)):
            Circle(SKETCH17_R)
        with Locations((-116, 29.337529527)):
            Circle(SKETCH17_R)
    extrude(amount=-CUT_EXTRUDE14_DEPTH, mode=Mode.SUBTRACT)

    # Sketch19 → Cut-Extrude16 (cut)
    with BuildSketch(Plane(origin=(0, 0, 0), x_dir=(-1, 0, 0), z_dir=(0, 0, -1))):
        with Locations((33, -34.730312102)):
            Circle(SKETCH19_R)
        with Locations((47, -34.730312102)):
            Circle(SKETCH19_R)
        with Locations((33, -50.230312102)):
            Circle(SKETCH19_R)
        with Locations((47, -50.230312102)):
            Circle(SKETCH19_R)
    extrude(amount=-CUT_EXTRUDE16_DEPTH, mode=Mode.SUBTRACT)

    # Sketch20 → Cut-Extrude17 (cut)
    with BuildSketch(Plane(origin=(0, 0, 0), x_dir=(-1, 0, 0), z_dir=(0, 0, -1))):
        with Locations((-65.5, -110.317038372)):
            Rectangle(SKETCH20_W, SKETCH20_H)
    extrude(amount=-CUT_EXTRUDE17_DEPTH, mode=Mode.SUBTRACT)

    # Sketch21 → Cut-Extrude18 (cut)
    with BuildSketch(Plane(origin=(0, 0, 0), x_dir=(-1, 0, 0), z_dir=(0, 0, -1))):
        with BuildLine():
            Line((-29, -36.162470473), (-69, -36.162470473))
            ThreePointArc((-69, -36.162470473), (-74.402823378, -41.565293851), (-69, -46.968117229))
            Line((-69, -46.968117229), (-29, -46.968117229))
            ThreePointArc((-29, -46.968117229), (-23.597176622, -41.565293851), (-29, -36.162470473))
        make_face()
        with BuildLine():
            Line((115, -36.162470473), (75, -36.162470473))
            ThreePointArc((75, -36.162470473), (69.597176622, -41.565293851), (75, -46.968117229))
            Line((75, -46.968117229), (115, -46.968117229))
            ThreePointArc((115, -46.968117229), (120.402823378, -41.565293851), (115, -36.162470473))
        make_face()
    extrude(amount=-CUT_EXTRUDE18_DEPTH, mode=Mode.SUBTRACT)


solid = part.part
